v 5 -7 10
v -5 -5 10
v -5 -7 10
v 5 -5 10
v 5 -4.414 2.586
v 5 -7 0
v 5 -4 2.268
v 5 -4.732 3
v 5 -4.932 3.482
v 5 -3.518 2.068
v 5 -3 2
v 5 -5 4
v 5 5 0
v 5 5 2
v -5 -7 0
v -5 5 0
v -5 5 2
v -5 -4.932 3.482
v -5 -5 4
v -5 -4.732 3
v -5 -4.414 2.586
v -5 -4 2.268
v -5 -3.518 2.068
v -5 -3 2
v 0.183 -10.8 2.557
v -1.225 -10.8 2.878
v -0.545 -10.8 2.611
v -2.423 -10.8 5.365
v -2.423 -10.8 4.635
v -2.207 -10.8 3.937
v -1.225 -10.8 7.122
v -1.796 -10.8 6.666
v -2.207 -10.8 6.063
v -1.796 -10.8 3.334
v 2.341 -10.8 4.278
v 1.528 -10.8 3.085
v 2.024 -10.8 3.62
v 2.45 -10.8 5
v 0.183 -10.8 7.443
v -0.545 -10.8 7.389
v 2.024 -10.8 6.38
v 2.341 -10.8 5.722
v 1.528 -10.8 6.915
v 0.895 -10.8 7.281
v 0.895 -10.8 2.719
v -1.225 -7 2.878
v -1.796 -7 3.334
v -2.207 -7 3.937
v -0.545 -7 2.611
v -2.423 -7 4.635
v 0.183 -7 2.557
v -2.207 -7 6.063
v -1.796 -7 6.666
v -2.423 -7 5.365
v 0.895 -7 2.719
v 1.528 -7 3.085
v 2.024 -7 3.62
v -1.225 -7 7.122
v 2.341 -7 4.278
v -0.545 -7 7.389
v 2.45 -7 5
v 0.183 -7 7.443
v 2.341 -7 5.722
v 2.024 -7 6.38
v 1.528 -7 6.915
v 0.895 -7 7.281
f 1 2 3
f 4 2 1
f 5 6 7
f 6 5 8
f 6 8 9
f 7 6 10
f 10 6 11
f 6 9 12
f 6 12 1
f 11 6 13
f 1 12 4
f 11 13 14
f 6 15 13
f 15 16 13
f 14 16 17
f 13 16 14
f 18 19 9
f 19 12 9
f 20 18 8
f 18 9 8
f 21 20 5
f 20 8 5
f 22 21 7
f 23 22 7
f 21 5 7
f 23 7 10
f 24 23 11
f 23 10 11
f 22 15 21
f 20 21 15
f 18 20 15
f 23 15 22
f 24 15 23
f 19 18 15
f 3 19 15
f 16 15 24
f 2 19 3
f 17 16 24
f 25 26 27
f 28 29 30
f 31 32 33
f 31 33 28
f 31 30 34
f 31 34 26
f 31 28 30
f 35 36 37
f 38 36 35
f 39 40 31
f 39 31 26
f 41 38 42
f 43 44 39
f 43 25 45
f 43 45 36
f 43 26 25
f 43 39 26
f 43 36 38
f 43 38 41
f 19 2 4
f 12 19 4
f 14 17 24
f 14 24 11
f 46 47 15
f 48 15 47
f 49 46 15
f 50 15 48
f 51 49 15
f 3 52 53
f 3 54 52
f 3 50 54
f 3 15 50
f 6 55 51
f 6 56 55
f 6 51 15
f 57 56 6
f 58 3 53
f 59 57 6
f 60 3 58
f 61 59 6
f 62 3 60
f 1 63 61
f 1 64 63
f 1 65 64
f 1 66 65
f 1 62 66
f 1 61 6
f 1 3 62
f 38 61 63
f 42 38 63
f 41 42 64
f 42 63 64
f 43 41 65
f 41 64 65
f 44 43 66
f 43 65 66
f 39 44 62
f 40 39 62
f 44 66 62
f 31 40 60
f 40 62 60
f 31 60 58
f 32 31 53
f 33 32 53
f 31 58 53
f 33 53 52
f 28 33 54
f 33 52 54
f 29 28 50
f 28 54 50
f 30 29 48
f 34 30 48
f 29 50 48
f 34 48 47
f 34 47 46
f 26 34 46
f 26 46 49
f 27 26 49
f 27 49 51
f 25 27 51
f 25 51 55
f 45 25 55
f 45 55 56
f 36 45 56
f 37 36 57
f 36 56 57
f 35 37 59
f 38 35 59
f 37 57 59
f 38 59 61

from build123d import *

# Parameters (mm, degrees)
SKETCH_W     = 10
SKETCH_H     = 10
PAD_DEPTH    = 2
SKETCH001_W  = 10
SKETCH001_H  = 10
PAD001_DEPTH = 2
SKETCH002_R  = 2.45
PAD002_DEPTH = 3.8
FILLET_R     = 2


with BuildPart() as part:
    # Sketch → Pad (new body)
    with BuildSketch(Plane.XY):
        Rectangle(SKETCH_W, SKETCH_H)
    extrude(amount=PAD_DEPTH)

    # Sketch001 (on Face3 of Pad) → Pad001 (join)
    with BuildSketch(Plane.XZ.offset(5)):
        with Locations((0, 5)):
            Rectangle(SKETCH001_W, SKETCH001_H)
    extrude(amount=PAD001_DEPTH)

    # Sketch002 → Pad002 (join)
    with BuildSketch(Plane.XZ.offset(7)):
        with Locations((0, 5)):
            Circle(SKETCH002_R)
    extrude(amount=PAD002_DEPTH)

    # Fillet
    fillet_edges = [part.edges().sort_by_distance(p)[0] for p in [
        (0, -5, 2),
    ]]
    fillet(fillet_edges, radius=FILLET_R)


solid = part.part
